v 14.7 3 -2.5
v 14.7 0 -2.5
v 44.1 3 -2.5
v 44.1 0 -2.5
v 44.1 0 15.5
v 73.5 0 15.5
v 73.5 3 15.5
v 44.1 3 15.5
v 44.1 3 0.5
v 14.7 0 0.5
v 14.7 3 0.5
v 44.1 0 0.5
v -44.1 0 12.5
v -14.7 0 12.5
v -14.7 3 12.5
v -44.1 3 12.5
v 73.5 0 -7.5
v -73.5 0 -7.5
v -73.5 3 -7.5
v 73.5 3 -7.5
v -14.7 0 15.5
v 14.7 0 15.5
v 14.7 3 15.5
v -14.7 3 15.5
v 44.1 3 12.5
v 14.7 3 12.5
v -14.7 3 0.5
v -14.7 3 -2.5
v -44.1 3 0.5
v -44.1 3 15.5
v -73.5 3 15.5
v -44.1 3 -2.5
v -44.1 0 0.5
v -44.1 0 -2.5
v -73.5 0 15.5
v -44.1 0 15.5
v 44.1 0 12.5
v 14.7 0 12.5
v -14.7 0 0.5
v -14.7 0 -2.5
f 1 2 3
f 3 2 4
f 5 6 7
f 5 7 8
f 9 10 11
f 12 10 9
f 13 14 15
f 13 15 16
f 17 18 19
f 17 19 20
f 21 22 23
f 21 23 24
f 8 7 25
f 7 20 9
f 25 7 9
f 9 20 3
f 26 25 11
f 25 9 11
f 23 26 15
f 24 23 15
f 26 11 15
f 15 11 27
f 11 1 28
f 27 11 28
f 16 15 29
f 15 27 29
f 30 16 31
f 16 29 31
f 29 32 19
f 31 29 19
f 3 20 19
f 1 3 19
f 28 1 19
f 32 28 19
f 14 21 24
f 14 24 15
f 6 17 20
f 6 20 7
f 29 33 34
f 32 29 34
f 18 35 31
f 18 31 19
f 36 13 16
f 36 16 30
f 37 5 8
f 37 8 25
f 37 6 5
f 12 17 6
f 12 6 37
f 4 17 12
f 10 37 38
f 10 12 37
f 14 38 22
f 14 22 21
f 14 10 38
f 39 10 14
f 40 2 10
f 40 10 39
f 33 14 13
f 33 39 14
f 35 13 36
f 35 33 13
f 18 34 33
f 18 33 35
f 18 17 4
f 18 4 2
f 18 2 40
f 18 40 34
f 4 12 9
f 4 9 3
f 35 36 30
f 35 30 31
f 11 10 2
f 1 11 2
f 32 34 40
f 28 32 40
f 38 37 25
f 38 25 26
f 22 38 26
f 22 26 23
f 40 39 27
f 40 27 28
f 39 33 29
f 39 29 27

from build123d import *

# Parameters (mm, degrees)
SKETCH1_W           = 29.4
SKETCH1_H           = 3
BOSS_EXTRUDE1_DEPTH = 3


with BuildPart() as part:
    # Sketch1 → Boss-Extrude1 (new body)
    with BuildSketch(Plane(origin=(0, 0, 0), x_dir=(1, 0, 0), z_dir=(0, 1, 0))):
        Polygon((-73.5, 7.5), (73.5, 7.5), (73.5, -15.5), (44.1, -15.5), (44.1, -12.5), (14.7, -12.5), (14.7, -15.5), (-14.7, -15.5), (-14.7, -12.5), (-44.1, -12.5), (-44.1, -15.5), (-73.5, -15.5), align=None)
        with Locations((29.4, 1)):
            Rectangle(SKETCH1_W, SKETCH1_H, mode=Mode.SUBTRACT)
        with Locations((-29.4, 1)):
            Rectangle(SKETCH1_W, SKETCH1_H, mode=Mode.SUBTRACT)
    extrude(amount=BOSS_EXTRUDE1_DEPTH)


solid = part.part
